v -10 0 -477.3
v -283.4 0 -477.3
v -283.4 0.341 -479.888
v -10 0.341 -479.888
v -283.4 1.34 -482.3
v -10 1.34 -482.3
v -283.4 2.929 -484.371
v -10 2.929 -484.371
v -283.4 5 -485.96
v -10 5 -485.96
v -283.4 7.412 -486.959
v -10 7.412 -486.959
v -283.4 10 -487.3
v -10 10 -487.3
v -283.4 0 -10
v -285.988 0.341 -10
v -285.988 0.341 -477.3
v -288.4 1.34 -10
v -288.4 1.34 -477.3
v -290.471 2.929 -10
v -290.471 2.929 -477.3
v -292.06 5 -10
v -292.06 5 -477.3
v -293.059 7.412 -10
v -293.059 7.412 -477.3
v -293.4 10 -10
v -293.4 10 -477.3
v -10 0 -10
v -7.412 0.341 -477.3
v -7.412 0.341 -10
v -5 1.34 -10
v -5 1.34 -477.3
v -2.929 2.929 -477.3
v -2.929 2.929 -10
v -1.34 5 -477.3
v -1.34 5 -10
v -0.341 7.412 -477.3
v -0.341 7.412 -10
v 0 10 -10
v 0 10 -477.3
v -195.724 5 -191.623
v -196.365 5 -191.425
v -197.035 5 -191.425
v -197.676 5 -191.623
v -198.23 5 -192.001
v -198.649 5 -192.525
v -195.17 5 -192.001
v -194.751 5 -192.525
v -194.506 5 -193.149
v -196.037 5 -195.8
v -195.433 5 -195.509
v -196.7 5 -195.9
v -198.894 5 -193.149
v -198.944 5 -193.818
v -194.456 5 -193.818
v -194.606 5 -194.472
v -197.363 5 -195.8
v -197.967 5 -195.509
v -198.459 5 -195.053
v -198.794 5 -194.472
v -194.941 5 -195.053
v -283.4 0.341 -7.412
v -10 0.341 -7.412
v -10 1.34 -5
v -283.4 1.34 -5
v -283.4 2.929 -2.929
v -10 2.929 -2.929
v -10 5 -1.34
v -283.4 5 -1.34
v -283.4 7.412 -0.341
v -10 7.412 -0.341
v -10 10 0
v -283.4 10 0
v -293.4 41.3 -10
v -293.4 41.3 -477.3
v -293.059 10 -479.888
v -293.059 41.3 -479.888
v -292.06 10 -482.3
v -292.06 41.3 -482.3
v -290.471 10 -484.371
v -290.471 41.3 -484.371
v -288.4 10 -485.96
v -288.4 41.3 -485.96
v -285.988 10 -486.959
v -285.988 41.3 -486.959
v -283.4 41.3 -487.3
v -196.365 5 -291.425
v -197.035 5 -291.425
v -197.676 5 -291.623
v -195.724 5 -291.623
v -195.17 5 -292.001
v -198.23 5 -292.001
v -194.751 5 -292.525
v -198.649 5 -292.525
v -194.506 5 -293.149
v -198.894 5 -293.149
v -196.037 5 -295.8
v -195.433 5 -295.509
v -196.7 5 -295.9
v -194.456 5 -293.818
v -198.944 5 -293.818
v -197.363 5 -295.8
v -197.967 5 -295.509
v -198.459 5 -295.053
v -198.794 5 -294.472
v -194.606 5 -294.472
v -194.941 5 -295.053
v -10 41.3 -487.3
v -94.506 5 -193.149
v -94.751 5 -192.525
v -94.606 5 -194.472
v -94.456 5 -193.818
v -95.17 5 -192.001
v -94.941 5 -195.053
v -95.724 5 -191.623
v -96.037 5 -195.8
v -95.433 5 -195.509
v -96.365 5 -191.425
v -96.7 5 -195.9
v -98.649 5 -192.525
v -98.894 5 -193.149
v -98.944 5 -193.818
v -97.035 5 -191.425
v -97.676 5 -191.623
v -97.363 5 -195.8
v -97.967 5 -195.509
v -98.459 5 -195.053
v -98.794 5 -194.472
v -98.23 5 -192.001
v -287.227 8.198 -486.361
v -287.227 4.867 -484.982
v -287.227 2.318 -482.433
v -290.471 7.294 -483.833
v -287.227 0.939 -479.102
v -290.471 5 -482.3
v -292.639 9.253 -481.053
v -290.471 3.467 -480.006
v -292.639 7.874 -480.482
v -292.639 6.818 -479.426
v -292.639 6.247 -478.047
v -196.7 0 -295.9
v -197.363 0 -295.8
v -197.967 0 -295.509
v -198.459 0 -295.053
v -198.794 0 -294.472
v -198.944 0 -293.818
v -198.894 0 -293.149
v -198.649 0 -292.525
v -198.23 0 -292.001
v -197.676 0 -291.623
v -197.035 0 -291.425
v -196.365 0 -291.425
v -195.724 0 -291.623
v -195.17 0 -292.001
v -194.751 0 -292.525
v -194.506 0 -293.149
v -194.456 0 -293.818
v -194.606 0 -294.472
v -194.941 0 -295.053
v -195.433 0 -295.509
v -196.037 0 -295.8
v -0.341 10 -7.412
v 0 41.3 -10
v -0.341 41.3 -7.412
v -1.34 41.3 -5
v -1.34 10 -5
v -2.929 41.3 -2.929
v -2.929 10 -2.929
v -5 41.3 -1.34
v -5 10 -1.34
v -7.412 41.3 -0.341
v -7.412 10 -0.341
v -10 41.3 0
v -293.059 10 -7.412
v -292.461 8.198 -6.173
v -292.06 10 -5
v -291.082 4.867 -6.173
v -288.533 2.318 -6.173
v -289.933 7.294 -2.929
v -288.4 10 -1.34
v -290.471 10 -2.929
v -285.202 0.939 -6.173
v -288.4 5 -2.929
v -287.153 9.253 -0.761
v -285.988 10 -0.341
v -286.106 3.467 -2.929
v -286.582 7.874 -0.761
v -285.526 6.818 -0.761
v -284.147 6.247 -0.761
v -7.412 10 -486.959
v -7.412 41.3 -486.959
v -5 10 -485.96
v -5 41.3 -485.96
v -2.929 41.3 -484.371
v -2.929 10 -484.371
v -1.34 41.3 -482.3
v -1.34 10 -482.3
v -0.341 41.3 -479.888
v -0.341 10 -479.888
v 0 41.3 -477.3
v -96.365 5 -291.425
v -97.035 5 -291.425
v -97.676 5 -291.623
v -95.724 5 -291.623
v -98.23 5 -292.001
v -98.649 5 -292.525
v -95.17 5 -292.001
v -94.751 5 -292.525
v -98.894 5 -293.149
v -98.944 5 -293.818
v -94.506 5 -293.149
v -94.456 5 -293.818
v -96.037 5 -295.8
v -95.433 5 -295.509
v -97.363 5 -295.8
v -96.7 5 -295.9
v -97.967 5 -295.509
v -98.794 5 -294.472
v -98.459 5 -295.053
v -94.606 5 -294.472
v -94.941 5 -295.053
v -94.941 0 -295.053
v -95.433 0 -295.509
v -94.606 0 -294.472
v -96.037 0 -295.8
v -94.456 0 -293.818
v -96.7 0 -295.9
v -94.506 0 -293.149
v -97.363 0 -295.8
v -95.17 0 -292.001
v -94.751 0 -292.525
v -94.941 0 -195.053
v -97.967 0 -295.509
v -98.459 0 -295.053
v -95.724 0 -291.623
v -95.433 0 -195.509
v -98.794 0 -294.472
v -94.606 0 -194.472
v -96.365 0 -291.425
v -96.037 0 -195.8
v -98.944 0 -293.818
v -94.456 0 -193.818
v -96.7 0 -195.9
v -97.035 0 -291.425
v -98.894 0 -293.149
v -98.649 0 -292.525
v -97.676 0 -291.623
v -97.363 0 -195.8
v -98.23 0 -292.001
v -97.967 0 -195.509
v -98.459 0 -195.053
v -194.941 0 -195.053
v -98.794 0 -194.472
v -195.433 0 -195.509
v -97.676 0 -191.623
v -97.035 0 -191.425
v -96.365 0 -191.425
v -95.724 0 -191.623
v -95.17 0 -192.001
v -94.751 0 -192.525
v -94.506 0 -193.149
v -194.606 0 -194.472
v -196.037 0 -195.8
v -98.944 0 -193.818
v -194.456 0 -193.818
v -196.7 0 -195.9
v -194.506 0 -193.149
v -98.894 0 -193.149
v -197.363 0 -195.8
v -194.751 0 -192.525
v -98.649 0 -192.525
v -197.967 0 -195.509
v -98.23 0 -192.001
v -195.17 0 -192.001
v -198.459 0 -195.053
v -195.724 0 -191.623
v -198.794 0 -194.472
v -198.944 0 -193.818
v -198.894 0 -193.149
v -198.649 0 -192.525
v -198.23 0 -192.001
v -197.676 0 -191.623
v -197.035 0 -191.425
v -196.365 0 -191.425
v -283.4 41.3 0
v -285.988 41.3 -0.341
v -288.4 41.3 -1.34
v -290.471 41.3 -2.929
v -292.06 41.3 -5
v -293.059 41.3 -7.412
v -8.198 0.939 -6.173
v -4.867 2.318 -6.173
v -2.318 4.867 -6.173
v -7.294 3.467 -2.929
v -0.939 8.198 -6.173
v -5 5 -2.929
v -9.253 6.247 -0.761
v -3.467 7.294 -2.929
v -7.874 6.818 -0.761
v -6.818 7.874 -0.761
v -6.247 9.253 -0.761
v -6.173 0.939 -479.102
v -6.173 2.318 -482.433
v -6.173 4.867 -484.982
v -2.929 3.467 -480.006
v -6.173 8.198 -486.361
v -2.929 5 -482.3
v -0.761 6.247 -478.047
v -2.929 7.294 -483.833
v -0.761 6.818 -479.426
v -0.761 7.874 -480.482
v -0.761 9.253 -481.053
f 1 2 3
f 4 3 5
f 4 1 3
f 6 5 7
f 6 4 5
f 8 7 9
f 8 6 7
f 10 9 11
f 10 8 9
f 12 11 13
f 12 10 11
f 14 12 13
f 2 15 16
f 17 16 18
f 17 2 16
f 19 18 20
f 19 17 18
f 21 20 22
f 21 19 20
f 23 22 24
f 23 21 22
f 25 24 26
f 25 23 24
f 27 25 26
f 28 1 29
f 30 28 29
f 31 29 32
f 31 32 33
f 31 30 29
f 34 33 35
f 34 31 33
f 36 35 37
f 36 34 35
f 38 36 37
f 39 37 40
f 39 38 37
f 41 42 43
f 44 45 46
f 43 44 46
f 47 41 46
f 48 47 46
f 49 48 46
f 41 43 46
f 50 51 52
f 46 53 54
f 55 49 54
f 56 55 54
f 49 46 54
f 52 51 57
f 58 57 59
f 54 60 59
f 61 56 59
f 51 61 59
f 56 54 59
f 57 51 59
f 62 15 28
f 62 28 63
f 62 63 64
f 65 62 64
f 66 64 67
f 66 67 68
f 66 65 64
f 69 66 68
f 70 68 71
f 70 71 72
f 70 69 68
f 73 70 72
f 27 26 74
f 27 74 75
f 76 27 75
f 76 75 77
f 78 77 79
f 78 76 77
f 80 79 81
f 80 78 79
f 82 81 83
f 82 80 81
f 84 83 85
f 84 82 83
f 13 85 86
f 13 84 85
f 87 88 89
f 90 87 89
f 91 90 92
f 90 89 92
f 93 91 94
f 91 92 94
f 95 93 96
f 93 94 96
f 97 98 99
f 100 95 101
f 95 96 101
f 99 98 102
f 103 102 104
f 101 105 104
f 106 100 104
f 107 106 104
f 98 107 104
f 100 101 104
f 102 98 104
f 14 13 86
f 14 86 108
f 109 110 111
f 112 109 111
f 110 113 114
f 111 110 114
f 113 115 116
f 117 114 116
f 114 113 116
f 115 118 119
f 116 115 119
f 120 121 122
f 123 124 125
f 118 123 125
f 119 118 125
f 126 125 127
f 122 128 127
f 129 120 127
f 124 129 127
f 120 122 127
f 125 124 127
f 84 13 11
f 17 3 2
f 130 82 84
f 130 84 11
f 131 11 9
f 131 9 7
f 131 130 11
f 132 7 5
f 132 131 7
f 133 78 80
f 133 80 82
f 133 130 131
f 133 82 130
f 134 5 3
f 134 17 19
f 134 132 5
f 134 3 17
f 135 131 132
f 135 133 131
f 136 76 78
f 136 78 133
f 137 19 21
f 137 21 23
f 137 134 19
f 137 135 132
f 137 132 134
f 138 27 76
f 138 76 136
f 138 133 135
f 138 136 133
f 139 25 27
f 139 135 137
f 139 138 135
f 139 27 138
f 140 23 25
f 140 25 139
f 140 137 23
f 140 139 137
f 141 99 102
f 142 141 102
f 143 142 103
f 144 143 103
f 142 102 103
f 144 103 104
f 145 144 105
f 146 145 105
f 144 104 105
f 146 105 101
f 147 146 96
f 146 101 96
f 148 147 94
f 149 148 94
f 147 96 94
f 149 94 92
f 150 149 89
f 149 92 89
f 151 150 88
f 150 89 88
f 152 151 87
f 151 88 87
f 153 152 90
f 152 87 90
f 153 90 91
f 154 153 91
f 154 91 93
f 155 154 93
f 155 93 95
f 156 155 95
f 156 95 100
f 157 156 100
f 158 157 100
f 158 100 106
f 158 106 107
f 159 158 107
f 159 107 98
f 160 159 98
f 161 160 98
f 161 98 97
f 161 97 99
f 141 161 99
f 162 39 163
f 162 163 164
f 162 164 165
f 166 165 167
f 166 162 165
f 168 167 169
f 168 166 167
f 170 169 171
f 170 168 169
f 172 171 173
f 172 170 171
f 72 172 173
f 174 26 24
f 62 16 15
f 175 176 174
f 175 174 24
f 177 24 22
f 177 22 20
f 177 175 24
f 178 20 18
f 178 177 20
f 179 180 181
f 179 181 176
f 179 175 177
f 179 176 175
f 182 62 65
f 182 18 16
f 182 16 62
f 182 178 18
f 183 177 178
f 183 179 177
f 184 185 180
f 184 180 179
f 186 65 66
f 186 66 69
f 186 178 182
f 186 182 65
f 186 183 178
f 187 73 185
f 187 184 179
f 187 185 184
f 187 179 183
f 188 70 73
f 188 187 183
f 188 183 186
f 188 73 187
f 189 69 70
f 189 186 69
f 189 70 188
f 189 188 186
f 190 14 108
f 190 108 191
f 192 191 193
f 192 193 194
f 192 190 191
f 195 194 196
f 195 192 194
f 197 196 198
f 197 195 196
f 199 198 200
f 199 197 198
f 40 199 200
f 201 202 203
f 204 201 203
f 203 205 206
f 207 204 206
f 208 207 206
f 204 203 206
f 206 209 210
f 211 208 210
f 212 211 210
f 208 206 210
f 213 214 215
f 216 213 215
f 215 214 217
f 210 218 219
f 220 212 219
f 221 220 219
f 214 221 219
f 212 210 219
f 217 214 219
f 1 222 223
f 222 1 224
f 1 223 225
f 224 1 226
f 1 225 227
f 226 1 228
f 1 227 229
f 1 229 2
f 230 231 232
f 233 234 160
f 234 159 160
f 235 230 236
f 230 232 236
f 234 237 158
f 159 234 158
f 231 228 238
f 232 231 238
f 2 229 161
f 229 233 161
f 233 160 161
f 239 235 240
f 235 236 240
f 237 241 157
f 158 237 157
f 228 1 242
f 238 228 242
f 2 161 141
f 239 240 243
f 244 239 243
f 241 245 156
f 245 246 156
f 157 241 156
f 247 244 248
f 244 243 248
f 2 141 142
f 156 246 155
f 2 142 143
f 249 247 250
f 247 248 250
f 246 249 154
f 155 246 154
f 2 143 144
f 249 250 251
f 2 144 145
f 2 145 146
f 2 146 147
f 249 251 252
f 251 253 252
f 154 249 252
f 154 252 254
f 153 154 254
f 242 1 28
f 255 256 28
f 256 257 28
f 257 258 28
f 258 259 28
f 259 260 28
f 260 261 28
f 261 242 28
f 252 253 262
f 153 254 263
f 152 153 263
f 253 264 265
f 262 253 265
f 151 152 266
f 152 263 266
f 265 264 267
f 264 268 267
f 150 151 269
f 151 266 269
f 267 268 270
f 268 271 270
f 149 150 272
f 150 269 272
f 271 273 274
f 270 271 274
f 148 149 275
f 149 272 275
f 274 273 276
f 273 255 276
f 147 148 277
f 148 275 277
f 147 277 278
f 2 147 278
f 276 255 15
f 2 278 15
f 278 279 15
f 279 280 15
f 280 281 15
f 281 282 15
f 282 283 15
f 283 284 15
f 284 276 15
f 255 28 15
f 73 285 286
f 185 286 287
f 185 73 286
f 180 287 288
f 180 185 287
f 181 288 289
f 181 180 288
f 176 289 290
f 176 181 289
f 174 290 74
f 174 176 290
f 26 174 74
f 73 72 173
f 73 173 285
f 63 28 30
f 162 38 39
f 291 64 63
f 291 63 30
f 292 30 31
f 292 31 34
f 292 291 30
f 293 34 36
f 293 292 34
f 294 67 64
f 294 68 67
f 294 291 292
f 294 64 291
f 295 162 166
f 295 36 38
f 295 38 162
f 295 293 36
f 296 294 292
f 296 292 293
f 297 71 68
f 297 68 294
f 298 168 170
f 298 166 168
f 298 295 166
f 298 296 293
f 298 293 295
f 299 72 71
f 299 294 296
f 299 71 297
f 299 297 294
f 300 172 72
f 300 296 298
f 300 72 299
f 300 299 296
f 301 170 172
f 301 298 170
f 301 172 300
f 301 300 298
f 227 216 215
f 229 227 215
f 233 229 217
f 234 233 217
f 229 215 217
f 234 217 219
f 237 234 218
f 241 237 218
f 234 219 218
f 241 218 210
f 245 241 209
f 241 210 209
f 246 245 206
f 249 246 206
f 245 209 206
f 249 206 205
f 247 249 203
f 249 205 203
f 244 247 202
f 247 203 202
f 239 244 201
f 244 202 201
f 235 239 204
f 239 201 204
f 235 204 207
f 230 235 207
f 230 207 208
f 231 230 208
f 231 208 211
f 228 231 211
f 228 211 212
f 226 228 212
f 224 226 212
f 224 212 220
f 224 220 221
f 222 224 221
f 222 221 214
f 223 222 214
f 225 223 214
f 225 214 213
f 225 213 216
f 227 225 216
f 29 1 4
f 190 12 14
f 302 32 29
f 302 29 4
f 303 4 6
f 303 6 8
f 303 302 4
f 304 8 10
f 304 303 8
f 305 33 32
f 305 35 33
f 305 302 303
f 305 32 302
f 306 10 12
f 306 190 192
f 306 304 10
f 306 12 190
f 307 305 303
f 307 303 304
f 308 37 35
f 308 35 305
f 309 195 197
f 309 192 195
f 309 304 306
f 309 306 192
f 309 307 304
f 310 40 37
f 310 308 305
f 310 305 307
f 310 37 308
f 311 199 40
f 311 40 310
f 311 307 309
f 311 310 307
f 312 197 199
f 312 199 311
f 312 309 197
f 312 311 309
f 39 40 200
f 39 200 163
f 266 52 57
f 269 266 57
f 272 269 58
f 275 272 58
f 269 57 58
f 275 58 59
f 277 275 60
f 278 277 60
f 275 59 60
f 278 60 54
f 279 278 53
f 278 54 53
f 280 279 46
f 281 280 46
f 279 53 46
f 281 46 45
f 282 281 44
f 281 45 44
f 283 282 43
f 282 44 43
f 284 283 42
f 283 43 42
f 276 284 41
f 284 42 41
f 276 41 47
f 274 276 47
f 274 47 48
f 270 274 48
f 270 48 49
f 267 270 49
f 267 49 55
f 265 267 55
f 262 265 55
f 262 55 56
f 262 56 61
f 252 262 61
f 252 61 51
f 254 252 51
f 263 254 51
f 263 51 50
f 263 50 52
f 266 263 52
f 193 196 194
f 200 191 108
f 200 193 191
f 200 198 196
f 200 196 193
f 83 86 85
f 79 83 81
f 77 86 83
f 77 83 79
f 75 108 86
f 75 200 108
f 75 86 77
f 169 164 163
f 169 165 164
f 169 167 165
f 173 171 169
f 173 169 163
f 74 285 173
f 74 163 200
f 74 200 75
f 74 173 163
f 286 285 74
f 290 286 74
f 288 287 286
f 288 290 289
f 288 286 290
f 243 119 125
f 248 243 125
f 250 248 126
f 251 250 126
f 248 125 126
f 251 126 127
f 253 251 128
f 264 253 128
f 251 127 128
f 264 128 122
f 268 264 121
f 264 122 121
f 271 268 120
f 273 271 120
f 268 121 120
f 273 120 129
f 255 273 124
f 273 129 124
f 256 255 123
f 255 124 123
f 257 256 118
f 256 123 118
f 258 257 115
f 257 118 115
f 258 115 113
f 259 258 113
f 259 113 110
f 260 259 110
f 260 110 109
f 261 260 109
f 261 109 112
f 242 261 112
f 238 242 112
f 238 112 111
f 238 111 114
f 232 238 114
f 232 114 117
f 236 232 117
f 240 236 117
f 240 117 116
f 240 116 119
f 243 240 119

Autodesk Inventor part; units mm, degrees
ref_plane "YZ Plane" through (0, 0, 0) normal (1, 0, 0) x (0, 1, 0)
ref_plane "XZ Plane" through (0, 0, 0) normal (0, 1, 0) x (-1, 0, 0)
ref_plane "XY Plane" through (0, 0, 0) normal (0, 0, 1) x (1, 0, 0)
sketch "Sketch1" plane through (0, 0, 0) normal (0, 1, 0) x (-1, 0, 0)
  line L0 (0, 0) -> (293.4, 0)
  line L1 (293.4, 0) -> (293.4, -487.3)
  line L2 (293.4, -487.3) -> (0, -487.3)
  line L3 (0, -487.3) -> (0, 0)
  dimension "d0" = 293.4
  dimension "d1" = 487.3
extrude "Extrusion1" add sketch "Sketch1" along normal blind 41.3
fillet "Fillet1" radius 10 4 edges at (0, 0, -243.65) (-146.7, 0, 0) (-293.4, 0, -243.65) (-146.7, 0, -487.3)
fillet "Fillet2" radius 10 8 edges at (-2.9289, 2.9289, -484.3711) (0, 25.65, -487.3) (-290.4711, 2.9289, -484.3711) (-293.4, 25.65, -487.3) (-2.9289, 2.9289, -2.9289) (0, 25.65, 0) (-293.4, 25.65, 0) (-290.4711, 2.9289, -2.9289)
sketch "Sketch2" plane through (0, 0, 0) normal (0, -1, 0) x (1, 0, 0)
  line L0 (-283.4, -487.3) -> (-10, -487.3) projected
  line L1 (-293.4, -10) -> (-293.4, -477.3) projected
  point P0 (0, 0)
  point P1 (-196.7, -293.65)
  point P2 (-196.7, -193.65)
  point P3 (-96.7, -293.65)
  point P4 (-96.7, -193.65)
  dimension "d6" = 193.65
  dimension "d8" = 96.7
  dimension "d9" = 100
  dimension "d10" = 96.7
  dimension "d11" = 193.65
  dimension "d12" = 100
  dimension "d13" = 100
  dimension "d14" = 100
hole "Hole1" at (-196.7, 0, -293.65) at (-196.7, 0, -193.65) at (-96.7, 0, -293.65) at (-96.7, 0, -193.65) direction (0, 1, 0) diameter 4.5 depth 5
equation "\"d10\" = d8"
equation "\"d11\" = d6"
equation "\"d12\" = d9"
equation "\"d13\" = d9"
equation "\"d14\" = d9"
properties part number "Monitor"
